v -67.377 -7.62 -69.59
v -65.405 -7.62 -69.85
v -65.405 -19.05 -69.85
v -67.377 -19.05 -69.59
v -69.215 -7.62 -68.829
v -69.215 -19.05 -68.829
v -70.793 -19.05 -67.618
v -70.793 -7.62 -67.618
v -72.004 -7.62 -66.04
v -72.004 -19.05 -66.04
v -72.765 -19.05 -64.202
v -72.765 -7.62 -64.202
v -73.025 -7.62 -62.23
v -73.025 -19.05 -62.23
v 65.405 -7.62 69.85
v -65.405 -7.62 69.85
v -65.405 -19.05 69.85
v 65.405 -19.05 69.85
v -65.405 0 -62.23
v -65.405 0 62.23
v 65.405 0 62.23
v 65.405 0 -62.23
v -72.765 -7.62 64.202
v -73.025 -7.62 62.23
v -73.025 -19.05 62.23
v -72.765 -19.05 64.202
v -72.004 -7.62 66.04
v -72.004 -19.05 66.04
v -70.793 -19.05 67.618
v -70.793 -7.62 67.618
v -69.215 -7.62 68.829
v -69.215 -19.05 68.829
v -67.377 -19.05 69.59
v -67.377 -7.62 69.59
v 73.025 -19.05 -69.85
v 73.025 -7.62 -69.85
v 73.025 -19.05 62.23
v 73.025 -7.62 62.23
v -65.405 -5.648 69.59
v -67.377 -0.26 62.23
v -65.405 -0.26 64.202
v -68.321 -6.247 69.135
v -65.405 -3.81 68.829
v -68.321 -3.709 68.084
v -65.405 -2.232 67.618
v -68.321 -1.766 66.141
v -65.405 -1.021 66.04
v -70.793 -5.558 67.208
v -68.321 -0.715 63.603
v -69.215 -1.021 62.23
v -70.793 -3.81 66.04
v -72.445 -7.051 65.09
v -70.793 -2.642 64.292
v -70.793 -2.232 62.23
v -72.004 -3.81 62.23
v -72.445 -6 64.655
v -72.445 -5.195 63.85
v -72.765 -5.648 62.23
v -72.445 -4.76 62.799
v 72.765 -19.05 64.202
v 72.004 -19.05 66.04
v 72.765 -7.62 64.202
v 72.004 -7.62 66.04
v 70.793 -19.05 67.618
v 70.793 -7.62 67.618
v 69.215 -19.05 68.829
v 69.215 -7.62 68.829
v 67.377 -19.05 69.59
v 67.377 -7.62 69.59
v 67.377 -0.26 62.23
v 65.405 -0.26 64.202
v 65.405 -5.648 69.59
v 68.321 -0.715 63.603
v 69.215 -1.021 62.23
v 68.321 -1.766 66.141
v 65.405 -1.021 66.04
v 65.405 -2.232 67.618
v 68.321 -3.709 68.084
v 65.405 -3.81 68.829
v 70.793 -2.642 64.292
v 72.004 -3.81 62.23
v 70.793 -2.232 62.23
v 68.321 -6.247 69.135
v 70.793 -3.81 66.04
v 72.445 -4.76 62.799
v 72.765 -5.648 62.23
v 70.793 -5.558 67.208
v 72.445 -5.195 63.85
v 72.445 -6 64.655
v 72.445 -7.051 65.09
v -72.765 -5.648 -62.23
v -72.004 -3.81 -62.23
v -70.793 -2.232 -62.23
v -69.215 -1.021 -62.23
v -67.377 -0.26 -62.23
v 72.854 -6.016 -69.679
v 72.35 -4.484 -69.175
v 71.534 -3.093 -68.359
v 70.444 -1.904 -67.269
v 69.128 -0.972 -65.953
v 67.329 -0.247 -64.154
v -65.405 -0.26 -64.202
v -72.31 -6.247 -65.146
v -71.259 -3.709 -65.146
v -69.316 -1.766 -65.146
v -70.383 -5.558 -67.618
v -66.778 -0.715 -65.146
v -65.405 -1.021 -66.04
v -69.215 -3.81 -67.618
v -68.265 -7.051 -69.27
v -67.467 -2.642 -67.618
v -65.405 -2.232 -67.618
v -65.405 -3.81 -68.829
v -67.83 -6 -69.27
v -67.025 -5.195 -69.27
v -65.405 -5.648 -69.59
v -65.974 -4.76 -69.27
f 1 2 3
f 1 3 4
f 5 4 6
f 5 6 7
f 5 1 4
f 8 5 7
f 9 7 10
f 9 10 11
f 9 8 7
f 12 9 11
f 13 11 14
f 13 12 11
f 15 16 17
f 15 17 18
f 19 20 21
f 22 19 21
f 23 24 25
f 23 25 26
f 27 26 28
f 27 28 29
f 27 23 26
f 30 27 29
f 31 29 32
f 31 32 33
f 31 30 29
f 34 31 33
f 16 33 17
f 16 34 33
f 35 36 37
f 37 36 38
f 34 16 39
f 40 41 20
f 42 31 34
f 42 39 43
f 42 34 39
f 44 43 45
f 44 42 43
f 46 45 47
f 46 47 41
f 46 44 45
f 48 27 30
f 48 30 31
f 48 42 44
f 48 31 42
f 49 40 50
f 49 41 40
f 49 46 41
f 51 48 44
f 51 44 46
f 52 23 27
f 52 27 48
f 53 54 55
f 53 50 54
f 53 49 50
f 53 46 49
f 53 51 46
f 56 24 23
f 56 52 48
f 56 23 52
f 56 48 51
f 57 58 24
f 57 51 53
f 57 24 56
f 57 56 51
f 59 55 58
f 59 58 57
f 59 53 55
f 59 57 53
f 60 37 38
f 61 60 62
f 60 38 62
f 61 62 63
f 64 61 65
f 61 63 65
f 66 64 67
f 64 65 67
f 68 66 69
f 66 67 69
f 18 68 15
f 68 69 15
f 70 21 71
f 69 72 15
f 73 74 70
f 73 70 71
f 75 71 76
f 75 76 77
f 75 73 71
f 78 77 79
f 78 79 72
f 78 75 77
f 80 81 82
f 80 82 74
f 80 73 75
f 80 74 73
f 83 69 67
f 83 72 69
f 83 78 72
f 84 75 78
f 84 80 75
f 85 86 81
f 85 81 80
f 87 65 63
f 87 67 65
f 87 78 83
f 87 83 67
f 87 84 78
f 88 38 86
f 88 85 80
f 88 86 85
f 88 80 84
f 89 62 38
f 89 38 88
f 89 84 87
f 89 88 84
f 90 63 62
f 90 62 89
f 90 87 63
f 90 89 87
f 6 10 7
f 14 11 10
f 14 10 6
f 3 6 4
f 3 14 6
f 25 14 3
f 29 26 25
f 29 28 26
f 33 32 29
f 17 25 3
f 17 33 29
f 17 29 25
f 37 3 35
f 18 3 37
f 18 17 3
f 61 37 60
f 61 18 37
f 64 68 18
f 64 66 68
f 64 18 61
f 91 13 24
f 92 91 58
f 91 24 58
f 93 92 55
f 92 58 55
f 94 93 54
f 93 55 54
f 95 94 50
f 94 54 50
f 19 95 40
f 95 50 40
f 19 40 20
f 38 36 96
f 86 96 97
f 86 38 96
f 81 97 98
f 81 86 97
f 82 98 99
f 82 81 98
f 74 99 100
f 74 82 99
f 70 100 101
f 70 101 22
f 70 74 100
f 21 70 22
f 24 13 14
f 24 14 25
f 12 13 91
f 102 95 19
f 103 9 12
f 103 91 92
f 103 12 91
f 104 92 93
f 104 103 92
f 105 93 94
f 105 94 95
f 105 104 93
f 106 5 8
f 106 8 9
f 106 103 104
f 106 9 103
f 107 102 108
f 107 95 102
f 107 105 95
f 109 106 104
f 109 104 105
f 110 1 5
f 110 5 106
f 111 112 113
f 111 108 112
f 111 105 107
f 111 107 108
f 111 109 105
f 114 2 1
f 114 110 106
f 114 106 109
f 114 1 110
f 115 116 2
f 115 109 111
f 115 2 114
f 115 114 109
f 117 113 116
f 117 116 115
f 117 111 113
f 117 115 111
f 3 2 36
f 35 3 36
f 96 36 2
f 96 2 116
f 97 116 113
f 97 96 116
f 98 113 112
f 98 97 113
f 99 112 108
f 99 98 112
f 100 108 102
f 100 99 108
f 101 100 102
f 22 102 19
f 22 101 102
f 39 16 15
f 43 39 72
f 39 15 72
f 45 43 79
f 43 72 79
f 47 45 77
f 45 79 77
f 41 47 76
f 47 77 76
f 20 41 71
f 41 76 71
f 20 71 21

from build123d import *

# Parameters (mm, degrees)
F0_W         = 146.05
F0_H         = 139.7
F1_DEPTH     = 19.05
F2_R         = 7.62
F3_T1_DEPTH  = 30.48
F3_S5_W      = 7.62
F3_S5_H      = 7.62
F3_T6_DEPTH  = 7.62
F3_S11_W     = 7.62
F3_S11_H     = 7.62
F3_T12_DEPTH = 7.62
F4_T1_DEPTH  = 30.48
F4_S5_W      = 7.62
F4_S5_H      = 7.62
F4_T6_DEPTH  = 7.62


# Not quite as in the source:
# - a fillet or chamfer that OpenCascade refuses, or shapes differently, is made with other operations: its cross-section is extruded or revolved along the edge and cut away or added


with BuildPart() as f1:
    # F0 (on Front) → F1 (new body)
    with BuildSketch(Plane.XZ):
        Rectangle(F0_W, F0_H)
    extrude(amount=F1_DEPTH)

    # F2
    f2_edges = [f1.edges().sort_by_distance(p)[0] for p in [
        (73.025, 0, 0),
        (0, 0, 69.85),
        (-73.025, 0, 0),
        (0, 0, -69.85),
    ]]
    fillet(f2_edges, radius=F2_R)

    # F3: fillet of radius 7.62 on 2 edges, made by hand

    # F3_s2 → F3_t1 (cut)
    with BuildSketch(Plane.XZ.offset(7.62)):
        with BuildLine():
            ThreePointArc((-73.025, 62.23), (-70.7931536726, 67.6181536726), (-65.405, 69.85))
            Line((-65.405, 69.85), (-73.025, 69.85))
            Line((-73.025, 69.85), (-73.025, 62.23))
        make_face()
        with BuildLine():
            ThreePointArc((73.025, 62.23), (70.7931536726, 67.6181536726), (65.405, 69.85))
            Line((65.405, 69.85), (73.025, 69.85))
            Line((73.025, 69.85), (73.025, 62.23))
        make_face()
    extrude(amount=F3_T1_DEPTH, mode=Mode.SUBTRACT)


with BuildPart() as f3_tool4:
    # F3_s5 → F3_t6 (new body)
    with BuildSketch(Plane.YZ.offset(65.405)):
        with Locations((-3.81, 66.04)):
            Rectangle(F3_S5_W, F3_S5_H)
    extrude(amount=F3_T6_DEPTH)

    # F3_s7 → F3_t8 (revolve, cut)
    with BuildSketch(Plane(origin=(65.405, -7.62, 62.23), x_dir=(0, -0.7071067812, -0.7071067812), z_dir=(0, -0.7071067812, 0.7071067812))):
        with BuildLine():
            ThreePointArc((0, -7.62), (7.62, 0), (0, 7.62))
            Line((0, 7.62), (0, -7.62))
        make_face()
    revolve(axis=Axis((65.405, -7.62, 62.23), (1, 0, 0)), mode=Mode.SUBTRACT)


with BuildPart() as f1_1:
    add(f1.part)

    # F3_t3: cut F3_tool4
    add(f3_tool4.part, mode=Mode.SUBTRACT)


with BuildPart() as f3_tool10:
    # F3_s11 → F3_t12 (new body)
    with BuildSketch(Plane.YZ.offset(-65.405)):
        with Locations((-3.81, 66.04)):
            Rectangle(F3_S11_W, F3_S11_H)
    extrude(amount=-F3_T12_DEPTH)

    # F3_s13 → F3_t14 (revolve, cut)
    with BuildSketch(Plane(origin=(-65.405, -7.62, 62.23), x_dir=(0, -0.7071067812, -0.7071067812), z_dir=(0, 0.7071067812, -0.7071067812))):
        with BuildLine():
            ThreePointArc((0, -7.62), (7.62, 0), (0, 7.62))
            Line((0, 7.62), (0, -7.62))
        make_face()
    revolve(axis=Axis((-65.405, -7.62, 62.23), (-1, 0, 0)), mode=Mode.SUBTRACT)


with BuildPart() as f1_2:
    add(f1_1.part)

    # F3_t9: cut F3_tool10
    add(f3_tool10.part, mode=Mode.SUBTRACT)

    # F4: fillet of radius 7.62 on 1 edges, made by hand

    # F4_s2 → F4_t1 (cut)
    with BuildSketch(Plane.XZ.offset(7.62)):
        with BuildLine():
            ThreePointArc((-65.405, -69.85), (-70.7931536726, -67.6181536726), (-73.025, -62.23))
            Line((-73.025, -62.23), (-73.025, -69.85))
            Line((-73.025, -69.85), (-65.405, -69.85))
        make_face()
    extrude(amount=F4_T1_DEPTH, mode=Mode.SUBTRACT)


with BuildPart() as f4_tool4:
    # F4_s5 → F4_t6 (new body)
    with BuildSketch(Plane.XY.offset(-62.23)):
        with Locations((-69.215, -3.81)):
            Rectangle(F4_S5_W, F4_S5_H)
    extrude(amount=-F4_T6_DEPTH)

    # F4_s7 → F4_t8 (revolve, cut)
    with BuildSketch(Plane(origin=(-65.405, -7.62, -62.23), x_dir=(0.7071067812, -0.7071067812, 0), z_dir=(0.7071067812, 0.7071067812, 0))):
        with BuildLine():
            ThreePointArc((0, -7.62), (7.62, 0), (0, 7.62))
            Line((0, 7.62), (0, -7.62))
        make_face()
    revolve(axis=Axis((-65.405, -7.62, -62.23), (0, 0, -1)), mode=Mode.SUBTRACT)


with BuildPart() as f1_3:
    add(f1_2.part)

    # F4_t3: cut F4_tool4
    add(f4_tool4.part, mode=Mode.SUBTRACT)


solid = f1_3.part
